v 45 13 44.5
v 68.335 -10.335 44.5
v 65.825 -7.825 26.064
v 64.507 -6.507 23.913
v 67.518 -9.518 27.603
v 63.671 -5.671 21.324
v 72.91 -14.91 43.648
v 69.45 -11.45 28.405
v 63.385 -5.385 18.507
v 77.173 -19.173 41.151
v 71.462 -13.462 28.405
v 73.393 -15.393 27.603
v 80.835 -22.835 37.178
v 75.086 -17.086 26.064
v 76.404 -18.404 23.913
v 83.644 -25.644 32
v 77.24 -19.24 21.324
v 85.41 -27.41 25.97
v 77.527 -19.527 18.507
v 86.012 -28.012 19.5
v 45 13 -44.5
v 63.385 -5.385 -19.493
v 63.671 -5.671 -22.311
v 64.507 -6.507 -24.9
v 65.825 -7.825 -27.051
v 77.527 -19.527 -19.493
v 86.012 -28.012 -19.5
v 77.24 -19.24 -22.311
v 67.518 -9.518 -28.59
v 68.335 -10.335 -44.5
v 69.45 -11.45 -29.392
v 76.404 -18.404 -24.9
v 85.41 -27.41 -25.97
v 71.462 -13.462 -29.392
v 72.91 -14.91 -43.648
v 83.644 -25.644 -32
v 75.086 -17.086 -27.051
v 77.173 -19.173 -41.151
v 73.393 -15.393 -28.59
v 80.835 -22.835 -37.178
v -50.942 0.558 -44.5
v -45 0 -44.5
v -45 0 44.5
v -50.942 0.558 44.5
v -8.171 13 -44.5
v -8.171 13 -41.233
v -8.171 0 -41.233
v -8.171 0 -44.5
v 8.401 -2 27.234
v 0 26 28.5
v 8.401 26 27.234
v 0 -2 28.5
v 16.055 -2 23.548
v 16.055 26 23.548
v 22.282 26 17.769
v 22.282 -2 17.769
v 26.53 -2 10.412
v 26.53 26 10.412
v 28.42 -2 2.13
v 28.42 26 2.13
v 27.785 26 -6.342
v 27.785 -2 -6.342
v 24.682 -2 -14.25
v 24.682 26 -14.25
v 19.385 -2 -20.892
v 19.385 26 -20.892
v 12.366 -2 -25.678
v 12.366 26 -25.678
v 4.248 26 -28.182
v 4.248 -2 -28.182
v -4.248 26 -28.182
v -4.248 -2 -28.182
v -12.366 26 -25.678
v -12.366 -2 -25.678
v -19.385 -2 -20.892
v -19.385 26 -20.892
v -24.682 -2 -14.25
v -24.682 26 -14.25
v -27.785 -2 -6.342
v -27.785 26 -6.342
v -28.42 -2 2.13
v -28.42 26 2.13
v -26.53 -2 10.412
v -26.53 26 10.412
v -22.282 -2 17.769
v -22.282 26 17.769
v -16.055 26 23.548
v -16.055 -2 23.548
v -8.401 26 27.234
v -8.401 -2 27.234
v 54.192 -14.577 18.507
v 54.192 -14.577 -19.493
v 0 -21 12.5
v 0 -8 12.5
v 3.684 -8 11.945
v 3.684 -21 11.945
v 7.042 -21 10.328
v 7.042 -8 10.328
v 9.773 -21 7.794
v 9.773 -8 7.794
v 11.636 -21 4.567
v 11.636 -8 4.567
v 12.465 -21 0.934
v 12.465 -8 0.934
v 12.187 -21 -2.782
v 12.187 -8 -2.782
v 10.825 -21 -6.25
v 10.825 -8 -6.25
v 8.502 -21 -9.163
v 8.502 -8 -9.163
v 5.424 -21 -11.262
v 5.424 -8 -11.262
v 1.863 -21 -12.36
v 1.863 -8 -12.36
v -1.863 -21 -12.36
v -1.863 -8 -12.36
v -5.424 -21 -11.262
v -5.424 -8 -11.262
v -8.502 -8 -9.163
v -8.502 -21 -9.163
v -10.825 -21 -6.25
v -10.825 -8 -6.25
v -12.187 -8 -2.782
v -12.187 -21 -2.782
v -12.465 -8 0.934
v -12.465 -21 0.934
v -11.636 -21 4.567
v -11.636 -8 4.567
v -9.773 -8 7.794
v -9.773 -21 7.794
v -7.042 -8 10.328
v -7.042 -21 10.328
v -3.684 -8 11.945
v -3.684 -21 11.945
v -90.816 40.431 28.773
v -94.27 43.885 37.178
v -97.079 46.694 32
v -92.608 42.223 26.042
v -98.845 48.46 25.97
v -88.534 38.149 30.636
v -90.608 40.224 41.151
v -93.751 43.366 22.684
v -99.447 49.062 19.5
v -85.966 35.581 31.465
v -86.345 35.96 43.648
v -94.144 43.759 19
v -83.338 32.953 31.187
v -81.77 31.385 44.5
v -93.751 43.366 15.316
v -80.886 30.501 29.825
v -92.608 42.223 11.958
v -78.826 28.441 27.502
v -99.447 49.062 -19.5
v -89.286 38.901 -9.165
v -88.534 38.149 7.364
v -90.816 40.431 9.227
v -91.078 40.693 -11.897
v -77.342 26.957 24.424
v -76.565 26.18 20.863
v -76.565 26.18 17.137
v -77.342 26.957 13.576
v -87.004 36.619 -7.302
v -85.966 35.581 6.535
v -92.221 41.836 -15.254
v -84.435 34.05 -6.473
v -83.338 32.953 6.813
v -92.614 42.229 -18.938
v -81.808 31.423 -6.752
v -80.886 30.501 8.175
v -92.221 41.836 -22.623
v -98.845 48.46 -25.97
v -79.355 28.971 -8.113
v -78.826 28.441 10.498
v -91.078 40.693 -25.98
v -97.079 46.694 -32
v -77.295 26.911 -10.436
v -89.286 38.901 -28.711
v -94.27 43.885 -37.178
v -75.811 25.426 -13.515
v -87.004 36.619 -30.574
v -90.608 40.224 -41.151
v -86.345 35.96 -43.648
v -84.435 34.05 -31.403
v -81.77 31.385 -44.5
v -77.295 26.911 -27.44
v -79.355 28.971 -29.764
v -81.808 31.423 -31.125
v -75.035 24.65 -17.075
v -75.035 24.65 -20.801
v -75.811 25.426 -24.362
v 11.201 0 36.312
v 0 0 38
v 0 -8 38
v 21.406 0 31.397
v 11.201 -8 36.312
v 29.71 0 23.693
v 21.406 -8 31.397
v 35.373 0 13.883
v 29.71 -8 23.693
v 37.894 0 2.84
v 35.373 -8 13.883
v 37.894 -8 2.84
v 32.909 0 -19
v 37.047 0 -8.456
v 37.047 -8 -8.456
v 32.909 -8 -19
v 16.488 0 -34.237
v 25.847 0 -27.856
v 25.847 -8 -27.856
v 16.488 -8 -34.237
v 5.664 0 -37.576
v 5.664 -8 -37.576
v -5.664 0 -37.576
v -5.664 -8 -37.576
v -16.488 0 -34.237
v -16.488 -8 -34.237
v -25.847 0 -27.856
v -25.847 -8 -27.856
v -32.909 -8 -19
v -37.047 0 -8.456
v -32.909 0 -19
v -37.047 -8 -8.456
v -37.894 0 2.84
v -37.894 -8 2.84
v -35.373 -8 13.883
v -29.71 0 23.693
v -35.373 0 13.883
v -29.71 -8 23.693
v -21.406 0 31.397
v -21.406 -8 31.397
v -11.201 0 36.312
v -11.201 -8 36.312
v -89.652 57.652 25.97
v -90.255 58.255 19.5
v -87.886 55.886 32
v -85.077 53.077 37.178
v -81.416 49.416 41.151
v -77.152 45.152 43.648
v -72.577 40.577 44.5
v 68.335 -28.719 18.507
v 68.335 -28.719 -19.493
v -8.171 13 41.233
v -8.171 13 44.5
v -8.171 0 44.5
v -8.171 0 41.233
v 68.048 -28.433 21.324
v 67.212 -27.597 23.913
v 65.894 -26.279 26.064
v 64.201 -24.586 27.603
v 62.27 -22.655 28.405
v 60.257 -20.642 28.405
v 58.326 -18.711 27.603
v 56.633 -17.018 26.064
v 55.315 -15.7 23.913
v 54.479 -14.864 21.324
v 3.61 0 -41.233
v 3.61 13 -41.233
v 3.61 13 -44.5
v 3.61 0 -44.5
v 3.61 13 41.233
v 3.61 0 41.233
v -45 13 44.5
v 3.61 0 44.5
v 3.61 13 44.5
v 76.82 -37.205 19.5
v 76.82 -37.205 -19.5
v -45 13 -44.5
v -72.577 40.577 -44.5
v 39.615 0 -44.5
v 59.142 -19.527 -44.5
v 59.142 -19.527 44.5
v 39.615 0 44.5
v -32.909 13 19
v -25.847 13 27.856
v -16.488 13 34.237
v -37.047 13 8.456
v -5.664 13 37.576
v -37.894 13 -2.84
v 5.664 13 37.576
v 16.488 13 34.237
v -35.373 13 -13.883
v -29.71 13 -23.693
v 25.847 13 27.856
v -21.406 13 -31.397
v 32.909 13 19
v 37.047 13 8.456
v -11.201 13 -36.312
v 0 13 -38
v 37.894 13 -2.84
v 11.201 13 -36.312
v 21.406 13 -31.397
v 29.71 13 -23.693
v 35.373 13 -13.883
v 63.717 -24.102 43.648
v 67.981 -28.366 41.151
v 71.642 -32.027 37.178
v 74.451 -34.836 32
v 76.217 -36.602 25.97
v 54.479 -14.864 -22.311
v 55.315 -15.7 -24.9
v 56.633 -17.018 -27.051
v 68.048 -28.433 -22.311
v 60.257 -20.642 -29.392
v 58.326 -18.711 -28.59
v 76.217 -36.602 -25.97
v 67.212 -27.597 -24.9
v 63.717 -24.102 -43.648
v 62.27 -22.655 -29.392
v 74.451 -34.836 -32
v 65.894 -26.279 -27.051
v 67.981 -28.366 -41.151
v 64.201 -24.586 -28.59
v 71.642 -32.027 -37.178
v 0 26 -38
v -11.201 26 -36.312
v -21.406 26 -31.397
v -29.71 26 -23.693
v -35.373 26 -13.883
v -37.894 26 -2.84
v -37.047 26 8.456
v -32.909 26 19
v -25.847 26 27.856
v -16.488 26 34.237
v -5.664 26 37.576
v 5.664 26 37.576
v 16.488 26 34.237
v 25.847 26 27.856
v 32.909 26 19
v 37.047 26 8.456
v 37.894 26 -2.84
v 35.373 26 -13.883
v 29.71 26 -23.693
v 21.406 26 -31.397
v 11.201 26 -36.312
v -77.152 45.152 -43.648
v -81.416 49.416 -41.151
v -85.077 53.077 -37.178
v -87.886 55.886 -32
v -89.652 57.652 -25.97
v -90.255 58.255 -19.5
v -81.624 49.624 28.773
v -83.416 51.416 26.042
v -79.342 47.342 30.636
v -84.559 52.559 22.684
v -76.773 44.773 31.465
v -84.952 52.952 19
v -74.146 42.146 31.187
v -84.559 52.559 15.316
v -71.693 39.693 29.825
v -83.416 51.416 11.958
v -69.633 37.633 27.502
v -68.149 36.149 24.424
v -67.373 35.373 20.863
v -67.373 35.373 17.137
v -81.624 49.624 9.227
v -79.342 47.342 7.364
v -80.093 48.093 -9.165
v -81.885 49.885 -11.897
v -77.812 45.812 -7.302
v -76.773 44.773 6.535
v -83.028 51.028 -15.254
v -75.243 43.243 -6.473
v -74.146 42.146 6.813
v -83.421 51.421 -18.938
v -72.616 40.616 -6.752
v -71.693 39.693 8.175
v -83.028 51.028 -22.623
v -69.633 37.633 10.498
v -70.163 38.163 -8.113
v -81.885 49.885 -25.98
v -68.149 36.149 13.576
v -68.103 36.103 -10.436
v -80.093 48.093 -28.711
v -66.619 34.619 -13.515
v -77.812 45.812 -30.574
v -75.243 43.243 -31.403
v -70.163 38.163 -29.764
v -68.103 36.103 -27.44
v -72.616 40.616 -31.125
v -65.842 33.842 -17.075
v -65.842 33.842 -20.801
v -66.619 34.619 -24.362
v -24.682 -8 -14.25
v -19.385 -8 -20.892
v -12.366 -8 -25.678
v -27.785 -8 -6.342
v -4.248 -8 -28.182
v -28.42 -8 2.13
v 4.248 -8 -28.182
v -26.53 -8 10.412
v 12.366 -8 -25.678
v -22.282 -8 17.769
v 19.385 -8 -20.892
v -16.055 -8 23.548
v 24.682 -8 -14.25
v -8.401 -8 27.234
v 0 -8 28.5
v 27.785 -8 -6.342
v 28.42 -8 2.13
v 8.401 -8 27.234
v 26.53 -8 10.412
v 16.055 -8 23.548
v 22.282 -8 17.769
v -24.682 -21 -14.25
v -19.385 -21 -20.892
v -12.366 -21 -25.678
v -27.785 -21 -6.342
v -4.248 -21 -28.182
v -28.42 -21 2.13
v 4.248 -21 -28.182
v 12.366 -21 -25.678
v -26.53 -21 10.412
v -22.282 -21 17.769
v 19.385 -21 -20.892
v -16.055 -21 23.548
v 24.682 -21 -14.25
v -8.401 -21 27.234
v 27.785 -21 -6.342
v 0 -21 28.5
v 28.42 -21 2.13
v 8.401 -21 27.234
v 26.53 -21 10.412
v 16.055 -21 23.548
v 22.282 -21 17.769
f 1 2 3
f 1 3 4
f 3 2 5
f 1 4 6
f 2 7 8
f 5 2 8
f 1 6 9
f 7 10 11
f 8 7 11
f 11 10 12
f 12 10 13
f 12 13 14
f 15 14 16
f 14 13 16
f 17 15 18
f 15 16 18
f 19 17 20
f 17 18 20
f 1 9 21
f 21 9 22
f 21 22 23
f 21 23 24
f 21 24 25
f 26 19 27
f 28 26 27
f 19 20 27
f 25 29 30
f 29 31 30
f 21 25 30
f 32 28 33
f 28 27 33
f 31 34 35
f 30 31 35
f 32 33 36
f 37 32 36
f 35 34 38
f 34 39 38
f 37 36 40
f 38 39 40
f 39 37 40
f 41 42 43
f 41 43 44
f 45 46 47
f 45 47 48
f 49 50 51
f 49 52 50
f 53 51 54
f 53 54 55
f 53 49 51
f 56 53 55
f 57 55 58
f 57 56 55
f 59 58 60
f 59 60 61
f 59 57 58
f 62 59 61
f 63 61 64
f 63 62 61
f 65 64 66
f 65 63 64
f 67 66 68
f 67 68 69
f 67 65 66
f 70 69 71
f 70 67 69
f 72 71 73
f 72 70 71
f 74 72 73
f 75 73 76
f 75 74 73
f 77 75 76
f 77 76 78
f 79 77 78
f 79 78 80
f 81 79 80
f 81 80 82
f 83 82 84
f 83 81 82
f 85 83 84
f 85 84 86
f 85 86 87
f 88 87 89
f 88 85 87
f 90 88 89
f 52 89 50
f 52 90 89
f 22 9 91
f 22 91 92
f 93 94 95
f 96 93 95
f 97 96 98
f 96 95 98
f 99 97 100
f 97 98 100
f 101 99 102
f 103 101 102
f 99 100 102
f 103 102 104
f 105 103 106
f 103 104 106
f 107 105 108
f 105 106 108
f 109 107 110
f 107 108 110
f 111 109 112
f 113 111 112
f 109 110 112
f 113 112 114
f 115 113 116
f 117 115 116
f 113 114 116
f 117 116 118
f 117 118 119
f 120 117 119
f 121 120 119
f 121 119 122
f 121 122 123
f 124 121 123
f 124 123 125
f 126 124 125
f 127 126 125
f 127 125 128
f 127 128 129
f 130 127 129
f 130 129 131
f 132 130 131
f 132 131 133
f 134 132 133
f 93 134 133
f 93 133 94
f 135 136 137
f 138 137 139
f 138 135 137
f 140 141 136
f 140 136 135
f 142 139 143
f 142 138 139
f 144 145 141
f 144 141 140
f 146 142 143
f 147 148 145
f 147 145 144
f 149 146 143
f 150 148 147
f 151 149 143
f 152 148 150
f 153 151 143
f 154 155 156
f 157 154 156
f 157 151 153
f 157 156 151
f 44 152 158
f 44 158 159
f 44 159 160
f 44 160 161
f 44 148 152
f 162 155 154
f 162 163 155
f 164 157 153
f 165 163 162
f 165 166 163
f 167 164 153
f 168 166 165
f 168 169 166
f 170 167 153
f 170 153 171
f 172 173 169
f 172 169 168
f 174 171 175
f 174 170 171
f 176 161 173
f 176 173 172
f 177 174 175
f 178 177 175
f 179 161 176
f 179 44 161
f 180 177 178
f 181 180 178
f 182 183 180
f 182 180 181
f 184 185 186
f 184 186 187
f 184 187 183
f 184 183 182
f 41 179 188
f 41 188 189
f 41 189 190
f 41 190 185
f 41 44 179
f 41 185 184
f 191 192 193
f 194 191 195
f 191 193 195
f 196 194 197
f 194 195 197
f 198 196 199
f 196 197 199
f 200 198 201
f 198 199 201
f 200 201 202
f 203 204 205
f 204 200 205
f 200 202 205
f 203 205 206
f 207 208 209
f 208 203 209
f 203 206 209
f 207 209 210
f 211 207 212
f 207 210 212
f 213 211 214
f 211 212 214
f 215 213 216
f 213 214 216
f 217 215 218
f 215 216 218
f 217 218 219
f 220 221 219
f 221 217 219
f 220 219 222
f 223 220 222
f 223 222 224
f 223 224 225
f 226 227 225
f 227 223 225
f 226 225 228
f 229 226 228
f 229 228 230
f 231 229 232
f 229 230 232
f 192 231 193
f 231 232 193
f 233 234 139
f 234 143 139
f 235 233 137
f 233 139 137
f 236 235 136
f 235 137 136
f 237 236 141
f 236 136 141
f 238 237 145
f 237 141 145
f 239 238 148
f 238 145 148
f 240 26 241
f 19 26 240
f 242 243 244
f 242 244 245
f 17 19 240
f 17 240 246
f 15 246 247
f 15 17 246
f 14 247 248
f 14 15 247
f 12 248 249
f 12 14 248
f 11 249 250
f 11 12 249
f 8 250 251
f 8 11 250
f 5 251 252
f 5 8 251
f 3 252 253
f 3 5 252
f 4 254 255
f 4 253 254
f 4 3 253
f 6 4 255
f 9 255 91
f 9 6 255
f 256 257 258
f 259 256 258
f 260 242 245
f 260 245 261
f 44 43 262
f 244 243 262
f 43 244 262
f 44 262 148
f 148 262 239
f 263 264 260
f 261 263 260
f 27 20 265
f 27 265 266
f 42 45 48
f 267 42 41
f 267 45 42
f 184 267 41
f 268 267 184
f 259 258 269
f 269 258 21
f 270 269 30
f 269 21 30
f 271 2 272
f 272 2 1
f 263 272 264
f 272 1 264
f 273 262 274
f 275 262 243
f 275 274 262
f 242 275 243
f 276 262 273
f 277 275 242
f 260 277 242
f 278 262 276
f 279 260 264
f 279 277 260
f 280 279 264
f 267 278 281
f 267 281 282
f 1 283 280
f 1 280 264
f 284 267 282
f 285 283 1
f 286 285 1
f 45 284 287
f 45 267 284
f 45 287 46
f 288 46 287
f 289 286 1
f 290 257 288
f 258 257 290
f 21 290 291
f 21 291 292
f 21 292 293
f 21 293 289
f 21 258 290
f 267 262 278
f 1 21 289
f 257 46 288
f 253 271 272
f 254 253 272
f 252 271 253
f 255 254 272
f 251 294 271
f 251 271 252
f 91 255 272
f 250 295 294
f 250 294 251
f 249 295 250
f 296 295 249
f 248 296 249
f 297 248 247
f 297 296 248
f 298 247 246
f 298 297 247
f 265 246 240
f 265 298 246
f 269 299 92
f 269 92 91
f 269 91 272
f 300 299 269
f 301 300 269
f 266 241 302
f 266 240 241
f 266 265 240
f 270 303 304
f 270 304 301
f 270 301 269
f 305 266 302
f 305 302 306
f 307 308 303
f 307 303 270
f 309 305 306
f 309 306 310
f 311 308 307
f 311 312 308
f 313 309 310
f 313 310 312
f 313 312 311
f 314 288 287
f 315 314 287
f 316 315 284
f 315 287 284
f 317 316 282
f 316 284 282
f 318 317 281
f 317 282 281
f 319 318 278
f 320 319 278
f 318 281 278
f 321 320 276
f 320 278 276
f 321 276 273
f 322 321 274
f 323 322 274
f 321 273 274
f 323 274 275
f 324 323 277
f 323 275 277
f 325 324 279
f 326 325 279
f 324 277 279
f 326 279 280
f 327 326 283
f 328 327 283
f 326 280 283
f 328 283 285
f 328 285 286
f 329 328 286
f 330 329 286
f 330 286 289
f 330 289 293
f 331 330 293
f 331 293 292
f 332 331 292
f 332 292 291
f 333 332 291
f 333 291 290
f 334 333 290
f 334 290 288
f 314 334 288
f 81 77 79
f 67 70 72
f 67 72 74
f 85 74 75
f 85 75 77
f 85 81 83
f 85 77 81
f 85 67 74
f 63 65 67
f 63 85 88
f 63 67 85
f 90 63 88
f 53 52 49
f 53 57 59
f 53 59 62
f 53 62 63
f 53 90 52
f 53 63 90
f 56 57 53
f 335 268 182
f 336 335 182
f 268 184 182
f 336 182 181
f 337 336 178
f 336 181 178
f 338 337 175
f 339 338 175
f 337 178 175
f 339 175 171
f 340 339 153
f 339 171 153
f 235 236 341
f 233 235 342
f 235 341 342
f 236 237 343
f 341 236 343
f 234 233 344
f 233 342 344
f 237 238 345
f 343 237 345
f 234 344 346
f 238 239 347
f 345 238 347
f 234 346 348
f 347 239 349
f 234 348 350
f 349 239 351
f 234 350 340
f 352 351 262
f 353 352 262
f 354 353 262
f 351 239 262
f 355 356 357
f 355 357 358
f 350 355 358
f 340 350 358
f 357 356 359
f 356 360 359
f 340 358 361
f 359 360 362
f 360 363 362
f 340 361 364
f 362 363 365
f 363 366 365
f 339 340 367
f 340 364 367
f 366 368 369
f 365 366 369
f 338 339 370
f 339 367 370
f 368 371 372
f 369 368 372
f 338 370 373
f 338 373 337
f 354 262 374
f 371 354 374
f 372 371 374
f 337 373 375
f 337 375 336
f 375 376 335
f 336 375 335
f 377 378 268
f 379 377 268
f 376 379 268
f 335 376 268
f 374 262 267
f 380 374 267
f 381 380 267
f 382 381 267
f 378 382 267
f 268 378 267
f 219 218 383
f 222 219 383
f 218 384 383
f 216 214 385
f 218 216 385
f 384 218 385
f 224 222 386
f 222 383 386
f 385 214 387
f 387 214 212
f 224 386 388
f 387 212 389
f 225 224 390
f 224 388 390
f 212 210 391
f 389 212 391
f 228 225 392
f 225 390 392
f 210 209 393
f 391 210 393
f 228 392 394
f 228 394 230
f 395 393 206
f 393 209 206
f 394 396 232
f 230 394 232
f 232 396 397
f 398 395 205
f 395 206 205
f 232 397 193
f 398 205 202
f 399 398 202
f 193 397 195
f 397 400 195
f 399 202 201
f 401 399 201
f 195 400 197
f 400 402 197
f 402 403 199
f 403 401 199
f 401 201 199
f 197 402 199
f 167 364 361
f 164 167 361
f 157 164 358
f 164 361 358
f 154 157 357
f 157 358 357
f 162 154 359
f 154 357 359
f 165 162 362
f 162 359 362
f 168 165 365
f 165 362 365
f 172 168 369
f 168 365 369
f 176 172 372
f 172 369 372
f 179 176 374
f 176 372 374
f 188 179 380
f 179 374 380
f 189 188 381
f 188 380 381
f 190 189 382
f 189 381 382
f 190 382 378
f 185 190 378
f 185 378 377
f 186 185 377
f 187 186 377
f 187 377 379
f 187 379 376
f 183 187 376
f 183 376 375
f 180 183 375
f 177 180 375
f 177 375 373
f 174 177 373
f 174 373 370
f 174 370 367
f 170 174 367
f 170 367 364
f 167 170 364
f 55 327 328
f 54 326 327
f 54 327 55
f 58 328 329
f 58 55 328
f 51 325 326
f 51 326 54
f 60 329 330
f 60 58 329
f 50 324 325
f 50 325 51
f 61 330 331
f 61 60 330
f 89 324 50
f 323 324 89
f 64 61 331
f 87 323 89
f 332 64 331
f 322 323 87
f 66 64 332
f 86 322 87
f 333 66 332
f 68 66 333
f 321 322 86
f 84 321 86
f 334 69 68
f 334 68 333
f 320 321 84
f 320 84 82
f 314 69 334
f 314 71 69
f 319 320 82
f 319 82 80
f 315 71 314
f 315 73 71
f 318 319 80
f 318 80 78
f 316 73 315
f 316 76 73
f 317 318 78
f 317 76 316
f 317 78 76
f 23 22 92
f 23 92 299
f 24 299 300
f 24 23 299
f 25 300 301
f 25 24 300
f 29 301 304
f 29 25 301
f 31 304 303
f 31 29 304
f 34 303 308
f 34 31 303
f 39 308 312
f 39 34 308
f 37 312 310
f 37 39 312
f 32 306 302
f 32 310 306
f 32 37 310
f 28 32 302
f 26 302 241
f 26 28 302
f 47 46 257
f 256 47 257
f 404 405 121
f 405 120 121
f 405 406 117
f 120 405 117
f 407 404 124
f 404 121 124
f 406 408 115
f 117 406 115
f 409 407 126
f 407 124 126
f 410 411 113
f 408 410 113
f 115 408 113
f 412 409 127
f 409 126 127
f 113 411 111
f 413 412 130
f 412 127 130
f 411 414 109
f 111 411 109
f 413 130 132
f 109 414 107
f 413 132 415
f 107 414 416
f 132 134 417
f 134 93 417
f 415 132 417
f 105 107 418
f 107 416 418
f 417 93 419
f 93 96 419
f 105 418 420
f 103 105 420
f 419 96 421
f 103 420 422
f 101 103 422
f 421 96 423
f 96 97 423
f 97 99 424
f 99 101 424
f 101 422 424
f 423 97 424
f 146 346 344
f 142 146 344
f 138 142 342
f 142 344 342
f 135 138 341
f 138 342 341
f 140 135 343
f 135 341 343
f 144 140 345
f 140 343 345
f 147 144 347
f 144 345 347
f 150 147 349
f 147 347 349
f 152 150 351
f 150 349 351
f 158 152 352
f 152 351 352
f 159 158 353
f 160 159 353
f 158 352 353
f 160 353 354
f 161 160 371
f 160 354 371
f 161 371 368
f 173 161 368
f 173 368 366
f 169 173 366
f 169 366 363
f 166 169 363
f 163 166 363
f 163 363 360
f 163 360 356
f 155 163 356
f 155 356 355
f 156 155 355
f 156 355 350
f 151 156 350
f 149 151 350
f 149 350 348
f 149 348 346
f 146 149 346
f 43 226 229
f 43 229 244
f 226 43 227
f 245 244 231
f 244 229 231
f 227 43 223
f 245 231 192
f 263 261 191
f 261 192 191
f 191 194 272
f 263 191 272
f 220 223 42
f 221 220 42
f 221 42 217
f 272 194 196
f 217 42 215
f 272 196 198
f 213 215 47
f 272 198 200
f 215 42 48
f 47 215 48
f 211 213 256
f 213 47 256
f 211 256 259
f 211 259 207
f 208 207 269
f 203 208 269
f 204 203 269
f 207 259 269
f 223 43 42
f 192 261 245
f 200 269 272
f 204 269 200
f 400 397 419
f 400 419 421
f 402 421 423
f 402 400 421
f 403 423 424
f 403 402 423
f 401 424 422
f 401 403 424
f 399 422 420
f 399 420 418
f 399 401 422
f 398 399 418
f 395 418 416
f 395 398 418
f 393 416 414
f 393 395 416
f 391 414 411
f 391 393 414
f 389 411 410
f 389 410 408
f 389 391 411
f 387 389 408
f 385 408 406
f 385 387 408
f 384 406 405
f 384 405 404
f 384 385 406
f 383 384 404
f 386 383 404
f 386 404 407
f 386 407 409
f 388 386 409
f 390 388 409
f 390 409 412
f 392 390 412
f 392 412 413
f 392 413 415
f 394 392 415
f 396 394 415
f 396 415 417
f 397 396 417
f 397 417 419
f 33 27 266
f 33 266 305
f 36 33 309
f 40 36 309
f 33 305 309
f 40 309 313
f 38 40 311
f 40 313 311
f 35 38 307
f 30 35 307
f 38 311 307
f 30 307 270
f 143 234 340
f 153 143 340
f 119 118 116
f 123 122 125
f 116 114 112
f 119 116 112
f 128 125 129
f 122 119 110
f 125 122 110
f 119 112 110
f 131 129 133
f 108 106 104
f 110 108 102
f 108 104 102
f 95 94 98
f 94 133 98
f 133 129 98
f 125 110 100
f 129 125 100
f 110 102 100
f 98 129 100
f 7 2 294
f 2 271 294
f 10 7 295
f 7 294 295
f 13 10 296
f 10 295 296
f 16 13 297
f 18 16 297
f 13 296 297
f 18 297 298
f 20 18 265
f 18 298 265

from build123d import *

# Parameters (mm, degrees)
SKETCH_2_W               = 90
SKETCH_2_H               = 89
EXTRUDE_1_DEPTH          = 13
SKETCH_3_W               = 89
SKETCH_3_H               = 58
EXTRUDE_2_DEPTH          = 13
FILLET_1_R               = 25
EXTRUDE_4_DEPTH          = 13
SKETCH_5_R               = 12.5
CUT_EXTRUDE_1_DEPTH      = 134.792817279
FILLET_2_R               = 25
CUT_EXTRUDE_2_DEPTH      = 152.201803843
SKETCH_7_R               = 38
EXTRUDE_5_DEPTH          = 13
CUT_EXTRUDE_3_DEPTH      = 13
CUT_EXTRUDE_3_DEPTH_BACK = 19
SKETCH_7_3_R             = 28.5
EXTRUDE_START            = -13
SKETCH_7_4_R             = 28.5
EXTRUDE_6_DEPTH          = 21
SKETCH_7_5_R             = 12.5
CUT_EXTRUDE_4_DEPTH      = 120.960410109
SKETCH_8_W               = 11.780980298
SKETCH_8_H               = 3.266568958
CUT_EXTRUDE_5_DEPTH      = 21
EXTRUDE_7_DEPTH          = 89
EXTRUDE_START_2          = -21
SKETCH_7_6_R             = 38
EXTRUDE_8_DEPTH          = 21
SKETCH_7_7_R             = 28.5
CUT_EXTRUDE_6_DEPTH      = 15


with BuildPart() as part:
    # 스케치2 → 보스-돌출1 (new body)
    with BuildSketch(Plane(origin=(0, 0, 0), x_dir=(1, 0, 0), z_dir=(0, 1, 0))):
        Rectangle(SKETCH_2_W, SKETCH_2_H)
    extrude(amount=EXTRUDE_1_DEPTH)

    # 스케치3 → 보스-돌출2 (add)
    with BuildSketch(Plane(origin=(29, 29, 0), x_dir=(0, 0, -1), z_dir=(-0.7071067811865438, -0.7071067811865512, 0))):
        with Locations((0, 51.627416998)):
            Rectangle(SKETCH_3_W, SKETCH_3_H)
    extrude(amount=EXTRUDE_2_DEPTH)

    # 필렛1
    fillet_1_edges = [part.edges().sort_by_distance(p)[0] for p in [
        (81.415999231, -32.608387387, -44.5),
        (81.415999231, -32.608387387, 44.5),
    ]]
    fillet(fillet_1_edges, radius=FILLET_1_R)

    # 스케치4 → 보스-돌출4 (add)
    with BuildSketch(Plane(origin=(-16, -16, 0), x_dir=(0, 0, -1), z_dir=(-0.7071067811865438, -0.7071067811865512, 0))):
        Polygon((44.5, -105.012193309), (44.5, -41.012193309), (44.5, -36.415999231), (-44.5, -36.415999231), (-44.5, -41.012193309), (-44.5, -105.012193309), align=None)
    extrude(amount=EXTRUDE_4_DEPTH)

    # 스케치5 → 컷-돌출1 (cut, through all)
    with BuildSketch(Plane(origin=(-16, -16, 0), x_dir=(0, 0, -1), z_dir=(0.707106781186544, 0.7071067811865511, 0))):
        with Locations((-19, 85.012193309)):
            Circle(SKETCH_5_R)
        with Locations((18.938317585, 82.847924647)):
            Circle(SKETCH_5_R)
    extrude(amount=-CUT_EXTRUDE_1_DEPTH, mode=Mode.SUBTRACT)

    # 필렛2
    fillet_2_edges = [part.edges().sort_by_distance(p)[0] for p in [
        (-94.851028074, 53.658639918, -44.5),
        (-94.851028074, 53.658639918, 44.5),
    ]]
    fillet(fillet_2_edges, radius=FILLET_2_R)

    # 스케치6 → 컷-돌출2 (cut, through all)
    with BuildSketch(Plane(origin=(29, 29, 0), x_dir=(0, 0, -1), z_dir=(0.707106781186544, 0.7071067811865511, 0))):
        with BuildLine():
            Line((-18.50653718, -48.627416998), (19.49346282, -48.627416998))
            ThreePointArc((19.49346282, -48.627416998), (29.49346282, -58.627416998), (19.49346282, -68.627416998))
            Line((19.49346282, -68.627416998), (-18.50653718, -68.627416998))
            ThreePointArc((-18.50653718, -68.627416998), (-28.50653718, -58.627416998), (-18.50653718, -48.627416998))
        make_face()
    extrude(amount=-CUT_EXTRUDE_2_DEPTH, mode=Mode.SUBTRACT)

    # 스케치7 → 보스-돌출5 (add)
    with BuildSketch(Plane(origin=(0, 13, 0), x_dir=(1, 0, 0), z_dir=(0, 1, 0))):
        Circle(SKETCH_7_R)
    extrude(amount=EXTRUDE_5_DEPTH)

    # 스케치7<3> → 컷-돌출3 (cut, two sides: drawn at the far end of the back side and taken through both)
    with BuildSketch(Plane(origin=(0, 13, 0), x_dir=(1, 0, 0), z_dir=(0, 1, 0)).offset(-CUT_EXTRUDE_3_DEPTH_BACK)):
        Circle(SKETCH_7_3_R)
    extrude(amount=CUT_EXTRUDE_3_DEPTH + CUT_EXTRUDE_3_DEPTH_BACK, mode=Mode.SUBTRACT)

    # 스케치8 → 컷-돌출5 (cut)
    with BuildSketch(Plane(origin=(0, 13, 0), x_dir=(1, 0, 0), z_dir=(0, 1, 0))):
        with Locations((-2.280738609, 42.866715521)):
            Rectangle(SKETCH_8_W, SKETCH_8_H)
        with Locations((-2.280738609, -42.866715521)):
            Rectangle(SKETCH_8_W, SKETCH_8_H)
    extrude(amount=-CUT_EXTRUDE_5_DEPTH, mode=Mode.SUBTRACT)

    # 스케치9 → 보스-돌출7 (add)
    with BuildSketch(Plane(origin=(0, 0, -44.5), x_dir=(-1, 0, 0), z_dir=(0, 0, -1))):
        Polygon((45, 6.5), (45, 0), (50.942388155, 0.557611845), align=None)
    extrude(amount=-EXTRUDE_7_DEPTH)



with BuildPart() as body_2:
    # 스케치7<4> → 보스-돌출6 (new body)
    with BuildSketch(Plane(origin=(0, 13, 0), x_dir=(1, 0, 0), z_dir=(0, 1, 0)).offset(EXTRUDE_START)):
        Circle(SKETCH_7_4_R)
    extrude(amount=-EXTRUDE_6_DEPTH)

    # 스케치7<5> → 컷-돌출4 (cut, through all)
    with BuildSketch(Plane(origin=(0, 13, 0), x_dir=(1, 0, 0), z_dir=(0, 1, 0))):
        Circle(SKETCH_7_5_R)
    extrude(amount=-CUT_EXTRUDE_4_DEPTH, mode=Mode.SUBTRACT)


with BuildPart() as part_1:
    add(part.part)

    add(body_2.part)  # 보스-돌출8 merges body 2
    # 스케치7<6> → 보스-돌출8 (add)
    with BuildSketch(Plane(origin=(0, 13, 0), x_dir=(1, 0, 0), z_dir=(0, 1, 0)).offset(EXTRUDE_START_2)):
        Circle(SKETCH_7_6_R)
    extrude(amount=EXTRUDE_8_DEPTH)

    # 스케치7<7> → 컷-돌출6 (cut)
    with BuildSketch(Plane(origin=(0, 13, 0), x_dir=(1, 0, 0), z_dir=(0, 1, 0))):
        Circle(SKETCH_7_7_R)
    extrude(amount=-CUT_EXTRUDE_6_DEPTH, mode=Mode.SUBTRACT)


solid = part_1.part
